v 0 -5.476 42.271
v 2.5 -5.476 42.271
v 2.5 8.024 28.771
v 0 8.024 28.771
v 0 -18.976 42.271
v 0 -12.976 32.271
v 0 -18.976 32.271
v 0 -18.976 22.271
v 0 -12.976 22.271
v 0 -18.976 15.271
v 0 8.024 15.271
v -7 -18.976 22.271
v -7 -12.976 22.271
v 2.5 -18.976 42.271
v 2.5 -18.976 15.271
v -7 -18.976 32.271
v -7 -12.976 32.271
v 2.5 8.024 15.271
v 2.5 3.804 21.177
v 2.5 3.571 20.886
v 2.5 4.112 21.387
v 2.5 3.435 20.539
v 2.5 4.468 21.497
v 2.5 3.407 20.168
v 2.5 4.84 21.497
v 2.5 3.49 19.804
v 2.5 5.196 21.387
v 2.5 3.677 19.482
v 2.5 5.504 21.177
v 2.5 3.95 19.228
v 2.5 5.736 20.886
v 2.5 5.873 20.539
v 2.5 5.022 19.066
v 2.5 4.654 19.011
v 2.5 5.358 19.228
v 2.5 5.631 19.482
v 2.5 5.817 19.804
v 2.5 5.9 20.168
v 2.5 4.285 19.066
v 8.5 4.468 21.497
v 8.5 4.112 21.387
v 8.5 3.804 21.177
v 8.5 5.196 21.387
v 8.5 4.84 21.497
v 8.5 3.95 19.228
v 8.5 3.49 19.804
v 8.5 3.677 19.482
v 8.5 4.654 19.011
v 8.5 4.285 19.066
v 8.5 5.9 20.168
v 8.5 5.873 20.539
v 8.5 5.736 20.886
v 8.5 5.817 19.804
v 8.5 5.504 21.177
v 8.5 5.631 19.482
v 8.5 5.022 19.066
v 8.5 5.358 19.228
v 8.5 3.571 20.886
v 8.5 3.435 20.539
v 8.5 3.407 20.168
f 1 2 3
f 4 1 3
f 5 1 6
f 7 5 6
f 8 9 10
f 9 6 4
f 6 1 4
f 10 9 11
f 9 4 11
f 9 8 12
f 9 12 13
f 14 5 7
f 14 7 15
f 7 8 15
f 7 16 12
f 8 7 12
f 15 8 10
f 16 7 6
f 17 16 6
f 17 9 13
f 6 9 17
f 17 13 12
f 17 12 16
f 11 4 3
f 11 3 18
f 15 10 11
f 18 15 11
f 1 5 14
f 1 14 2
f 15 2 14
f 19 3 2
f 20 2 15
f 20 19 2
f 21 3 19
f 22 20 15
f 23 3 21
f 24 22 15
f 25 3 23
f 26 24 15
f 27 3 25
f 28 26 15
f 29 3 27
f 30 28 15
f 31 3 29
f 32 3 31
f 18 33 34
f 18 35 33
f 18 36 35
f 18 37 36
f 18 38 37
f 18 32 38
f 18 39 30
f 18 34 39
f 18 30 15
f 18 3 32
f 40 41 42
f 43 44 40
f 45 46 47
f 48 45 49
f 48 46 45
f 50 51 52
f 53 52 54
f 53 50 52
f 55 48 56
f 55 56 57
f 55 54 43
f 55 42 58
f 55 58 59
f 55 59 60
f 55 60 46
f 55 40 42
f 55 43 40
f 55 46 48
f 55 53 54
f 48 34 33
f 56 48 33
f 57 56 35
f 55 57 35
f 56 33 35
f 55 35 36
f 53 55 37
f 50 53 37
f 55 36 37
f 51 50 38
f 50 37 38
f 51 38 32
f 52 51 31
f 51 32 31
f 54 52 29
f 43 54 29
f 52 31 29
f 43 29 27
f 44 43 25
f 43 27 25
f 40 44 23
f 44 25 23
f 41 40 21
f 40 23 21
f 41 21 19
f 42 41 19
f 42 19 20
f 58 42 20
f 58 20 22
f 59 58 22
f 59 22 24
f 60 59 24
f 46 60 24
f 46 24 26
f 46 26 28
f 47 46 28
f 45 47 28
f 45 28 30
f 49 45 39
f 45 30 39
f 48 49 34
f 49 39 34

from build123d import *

# Parameters (mm, degrees)
SKETCH1_W           = 27
SKETCH1_H           = 27
BOSS_EXTRUDE1_DEPTH = 2.5
SKETCH2_R           = 1.25
BOSS_EXTRUDE2_DEPTH = 6
SKETCH3_W           = 10
SKETCH3_H           = 6
BOSS_EXTRUDE3_DEPTH = 7
CUT_EXTRUDE1_DEPTH  = 10.5


with BuildPart() as part:
    # Sketch1 → Boss-Extrude1 (new body)
    with BuildSketch(Plane(origin=(0, 0, 0), x_dir=(0, 0, -1), z_dir=(1, 0, 0))):
        with Locations((-28.770960436, -5.47612775)):
            Rectangle(SKETCH1_W, SKETCH1_H)
    extrude(amount=BOSS_EXTRUDE1_DEPTH)

    # Sketch2 → Boss-Extrude2 (add)
    with BuildSketch(Plane(origin=(2.5, 0, 0), x_dir=(0, 0, -1), z_dir=(1, 0, 0))):
        with Locations((-20.260960436, 4.65387225)):
            Circle(SKETCH2_R)
    extrude(amount=BOSS_EXTRUDE2_DEPTH)

    # Sketch3 → Boss-Extrude3 (add)
    with BuildSketch(Plane.ZY):
        with Locations((27.270960436, -15.97612775)):
            Rectangle(SKETCH3_W, SKETCH3_H)
    extrude(amount=BOSS_EXTRUDE3_DEPTH)

    # Sketch4 → Cut-Extrude1 (cut, through all)
    with BuildSketch(Plane(origin=(2.5, 0, 0), x_dir=(0, 0, -1), z_dir=(1, 0, 0))):
        Polygon((-42.270960436, -5.47612775), (-28.770960436, 8.02387225), (-42.270960436, 8.02387225), align=None)
    extrude(amount=-CUT_EXTRUDE1_DEPTH, mode=Mode.SUBTRACT)


solid = part.part
